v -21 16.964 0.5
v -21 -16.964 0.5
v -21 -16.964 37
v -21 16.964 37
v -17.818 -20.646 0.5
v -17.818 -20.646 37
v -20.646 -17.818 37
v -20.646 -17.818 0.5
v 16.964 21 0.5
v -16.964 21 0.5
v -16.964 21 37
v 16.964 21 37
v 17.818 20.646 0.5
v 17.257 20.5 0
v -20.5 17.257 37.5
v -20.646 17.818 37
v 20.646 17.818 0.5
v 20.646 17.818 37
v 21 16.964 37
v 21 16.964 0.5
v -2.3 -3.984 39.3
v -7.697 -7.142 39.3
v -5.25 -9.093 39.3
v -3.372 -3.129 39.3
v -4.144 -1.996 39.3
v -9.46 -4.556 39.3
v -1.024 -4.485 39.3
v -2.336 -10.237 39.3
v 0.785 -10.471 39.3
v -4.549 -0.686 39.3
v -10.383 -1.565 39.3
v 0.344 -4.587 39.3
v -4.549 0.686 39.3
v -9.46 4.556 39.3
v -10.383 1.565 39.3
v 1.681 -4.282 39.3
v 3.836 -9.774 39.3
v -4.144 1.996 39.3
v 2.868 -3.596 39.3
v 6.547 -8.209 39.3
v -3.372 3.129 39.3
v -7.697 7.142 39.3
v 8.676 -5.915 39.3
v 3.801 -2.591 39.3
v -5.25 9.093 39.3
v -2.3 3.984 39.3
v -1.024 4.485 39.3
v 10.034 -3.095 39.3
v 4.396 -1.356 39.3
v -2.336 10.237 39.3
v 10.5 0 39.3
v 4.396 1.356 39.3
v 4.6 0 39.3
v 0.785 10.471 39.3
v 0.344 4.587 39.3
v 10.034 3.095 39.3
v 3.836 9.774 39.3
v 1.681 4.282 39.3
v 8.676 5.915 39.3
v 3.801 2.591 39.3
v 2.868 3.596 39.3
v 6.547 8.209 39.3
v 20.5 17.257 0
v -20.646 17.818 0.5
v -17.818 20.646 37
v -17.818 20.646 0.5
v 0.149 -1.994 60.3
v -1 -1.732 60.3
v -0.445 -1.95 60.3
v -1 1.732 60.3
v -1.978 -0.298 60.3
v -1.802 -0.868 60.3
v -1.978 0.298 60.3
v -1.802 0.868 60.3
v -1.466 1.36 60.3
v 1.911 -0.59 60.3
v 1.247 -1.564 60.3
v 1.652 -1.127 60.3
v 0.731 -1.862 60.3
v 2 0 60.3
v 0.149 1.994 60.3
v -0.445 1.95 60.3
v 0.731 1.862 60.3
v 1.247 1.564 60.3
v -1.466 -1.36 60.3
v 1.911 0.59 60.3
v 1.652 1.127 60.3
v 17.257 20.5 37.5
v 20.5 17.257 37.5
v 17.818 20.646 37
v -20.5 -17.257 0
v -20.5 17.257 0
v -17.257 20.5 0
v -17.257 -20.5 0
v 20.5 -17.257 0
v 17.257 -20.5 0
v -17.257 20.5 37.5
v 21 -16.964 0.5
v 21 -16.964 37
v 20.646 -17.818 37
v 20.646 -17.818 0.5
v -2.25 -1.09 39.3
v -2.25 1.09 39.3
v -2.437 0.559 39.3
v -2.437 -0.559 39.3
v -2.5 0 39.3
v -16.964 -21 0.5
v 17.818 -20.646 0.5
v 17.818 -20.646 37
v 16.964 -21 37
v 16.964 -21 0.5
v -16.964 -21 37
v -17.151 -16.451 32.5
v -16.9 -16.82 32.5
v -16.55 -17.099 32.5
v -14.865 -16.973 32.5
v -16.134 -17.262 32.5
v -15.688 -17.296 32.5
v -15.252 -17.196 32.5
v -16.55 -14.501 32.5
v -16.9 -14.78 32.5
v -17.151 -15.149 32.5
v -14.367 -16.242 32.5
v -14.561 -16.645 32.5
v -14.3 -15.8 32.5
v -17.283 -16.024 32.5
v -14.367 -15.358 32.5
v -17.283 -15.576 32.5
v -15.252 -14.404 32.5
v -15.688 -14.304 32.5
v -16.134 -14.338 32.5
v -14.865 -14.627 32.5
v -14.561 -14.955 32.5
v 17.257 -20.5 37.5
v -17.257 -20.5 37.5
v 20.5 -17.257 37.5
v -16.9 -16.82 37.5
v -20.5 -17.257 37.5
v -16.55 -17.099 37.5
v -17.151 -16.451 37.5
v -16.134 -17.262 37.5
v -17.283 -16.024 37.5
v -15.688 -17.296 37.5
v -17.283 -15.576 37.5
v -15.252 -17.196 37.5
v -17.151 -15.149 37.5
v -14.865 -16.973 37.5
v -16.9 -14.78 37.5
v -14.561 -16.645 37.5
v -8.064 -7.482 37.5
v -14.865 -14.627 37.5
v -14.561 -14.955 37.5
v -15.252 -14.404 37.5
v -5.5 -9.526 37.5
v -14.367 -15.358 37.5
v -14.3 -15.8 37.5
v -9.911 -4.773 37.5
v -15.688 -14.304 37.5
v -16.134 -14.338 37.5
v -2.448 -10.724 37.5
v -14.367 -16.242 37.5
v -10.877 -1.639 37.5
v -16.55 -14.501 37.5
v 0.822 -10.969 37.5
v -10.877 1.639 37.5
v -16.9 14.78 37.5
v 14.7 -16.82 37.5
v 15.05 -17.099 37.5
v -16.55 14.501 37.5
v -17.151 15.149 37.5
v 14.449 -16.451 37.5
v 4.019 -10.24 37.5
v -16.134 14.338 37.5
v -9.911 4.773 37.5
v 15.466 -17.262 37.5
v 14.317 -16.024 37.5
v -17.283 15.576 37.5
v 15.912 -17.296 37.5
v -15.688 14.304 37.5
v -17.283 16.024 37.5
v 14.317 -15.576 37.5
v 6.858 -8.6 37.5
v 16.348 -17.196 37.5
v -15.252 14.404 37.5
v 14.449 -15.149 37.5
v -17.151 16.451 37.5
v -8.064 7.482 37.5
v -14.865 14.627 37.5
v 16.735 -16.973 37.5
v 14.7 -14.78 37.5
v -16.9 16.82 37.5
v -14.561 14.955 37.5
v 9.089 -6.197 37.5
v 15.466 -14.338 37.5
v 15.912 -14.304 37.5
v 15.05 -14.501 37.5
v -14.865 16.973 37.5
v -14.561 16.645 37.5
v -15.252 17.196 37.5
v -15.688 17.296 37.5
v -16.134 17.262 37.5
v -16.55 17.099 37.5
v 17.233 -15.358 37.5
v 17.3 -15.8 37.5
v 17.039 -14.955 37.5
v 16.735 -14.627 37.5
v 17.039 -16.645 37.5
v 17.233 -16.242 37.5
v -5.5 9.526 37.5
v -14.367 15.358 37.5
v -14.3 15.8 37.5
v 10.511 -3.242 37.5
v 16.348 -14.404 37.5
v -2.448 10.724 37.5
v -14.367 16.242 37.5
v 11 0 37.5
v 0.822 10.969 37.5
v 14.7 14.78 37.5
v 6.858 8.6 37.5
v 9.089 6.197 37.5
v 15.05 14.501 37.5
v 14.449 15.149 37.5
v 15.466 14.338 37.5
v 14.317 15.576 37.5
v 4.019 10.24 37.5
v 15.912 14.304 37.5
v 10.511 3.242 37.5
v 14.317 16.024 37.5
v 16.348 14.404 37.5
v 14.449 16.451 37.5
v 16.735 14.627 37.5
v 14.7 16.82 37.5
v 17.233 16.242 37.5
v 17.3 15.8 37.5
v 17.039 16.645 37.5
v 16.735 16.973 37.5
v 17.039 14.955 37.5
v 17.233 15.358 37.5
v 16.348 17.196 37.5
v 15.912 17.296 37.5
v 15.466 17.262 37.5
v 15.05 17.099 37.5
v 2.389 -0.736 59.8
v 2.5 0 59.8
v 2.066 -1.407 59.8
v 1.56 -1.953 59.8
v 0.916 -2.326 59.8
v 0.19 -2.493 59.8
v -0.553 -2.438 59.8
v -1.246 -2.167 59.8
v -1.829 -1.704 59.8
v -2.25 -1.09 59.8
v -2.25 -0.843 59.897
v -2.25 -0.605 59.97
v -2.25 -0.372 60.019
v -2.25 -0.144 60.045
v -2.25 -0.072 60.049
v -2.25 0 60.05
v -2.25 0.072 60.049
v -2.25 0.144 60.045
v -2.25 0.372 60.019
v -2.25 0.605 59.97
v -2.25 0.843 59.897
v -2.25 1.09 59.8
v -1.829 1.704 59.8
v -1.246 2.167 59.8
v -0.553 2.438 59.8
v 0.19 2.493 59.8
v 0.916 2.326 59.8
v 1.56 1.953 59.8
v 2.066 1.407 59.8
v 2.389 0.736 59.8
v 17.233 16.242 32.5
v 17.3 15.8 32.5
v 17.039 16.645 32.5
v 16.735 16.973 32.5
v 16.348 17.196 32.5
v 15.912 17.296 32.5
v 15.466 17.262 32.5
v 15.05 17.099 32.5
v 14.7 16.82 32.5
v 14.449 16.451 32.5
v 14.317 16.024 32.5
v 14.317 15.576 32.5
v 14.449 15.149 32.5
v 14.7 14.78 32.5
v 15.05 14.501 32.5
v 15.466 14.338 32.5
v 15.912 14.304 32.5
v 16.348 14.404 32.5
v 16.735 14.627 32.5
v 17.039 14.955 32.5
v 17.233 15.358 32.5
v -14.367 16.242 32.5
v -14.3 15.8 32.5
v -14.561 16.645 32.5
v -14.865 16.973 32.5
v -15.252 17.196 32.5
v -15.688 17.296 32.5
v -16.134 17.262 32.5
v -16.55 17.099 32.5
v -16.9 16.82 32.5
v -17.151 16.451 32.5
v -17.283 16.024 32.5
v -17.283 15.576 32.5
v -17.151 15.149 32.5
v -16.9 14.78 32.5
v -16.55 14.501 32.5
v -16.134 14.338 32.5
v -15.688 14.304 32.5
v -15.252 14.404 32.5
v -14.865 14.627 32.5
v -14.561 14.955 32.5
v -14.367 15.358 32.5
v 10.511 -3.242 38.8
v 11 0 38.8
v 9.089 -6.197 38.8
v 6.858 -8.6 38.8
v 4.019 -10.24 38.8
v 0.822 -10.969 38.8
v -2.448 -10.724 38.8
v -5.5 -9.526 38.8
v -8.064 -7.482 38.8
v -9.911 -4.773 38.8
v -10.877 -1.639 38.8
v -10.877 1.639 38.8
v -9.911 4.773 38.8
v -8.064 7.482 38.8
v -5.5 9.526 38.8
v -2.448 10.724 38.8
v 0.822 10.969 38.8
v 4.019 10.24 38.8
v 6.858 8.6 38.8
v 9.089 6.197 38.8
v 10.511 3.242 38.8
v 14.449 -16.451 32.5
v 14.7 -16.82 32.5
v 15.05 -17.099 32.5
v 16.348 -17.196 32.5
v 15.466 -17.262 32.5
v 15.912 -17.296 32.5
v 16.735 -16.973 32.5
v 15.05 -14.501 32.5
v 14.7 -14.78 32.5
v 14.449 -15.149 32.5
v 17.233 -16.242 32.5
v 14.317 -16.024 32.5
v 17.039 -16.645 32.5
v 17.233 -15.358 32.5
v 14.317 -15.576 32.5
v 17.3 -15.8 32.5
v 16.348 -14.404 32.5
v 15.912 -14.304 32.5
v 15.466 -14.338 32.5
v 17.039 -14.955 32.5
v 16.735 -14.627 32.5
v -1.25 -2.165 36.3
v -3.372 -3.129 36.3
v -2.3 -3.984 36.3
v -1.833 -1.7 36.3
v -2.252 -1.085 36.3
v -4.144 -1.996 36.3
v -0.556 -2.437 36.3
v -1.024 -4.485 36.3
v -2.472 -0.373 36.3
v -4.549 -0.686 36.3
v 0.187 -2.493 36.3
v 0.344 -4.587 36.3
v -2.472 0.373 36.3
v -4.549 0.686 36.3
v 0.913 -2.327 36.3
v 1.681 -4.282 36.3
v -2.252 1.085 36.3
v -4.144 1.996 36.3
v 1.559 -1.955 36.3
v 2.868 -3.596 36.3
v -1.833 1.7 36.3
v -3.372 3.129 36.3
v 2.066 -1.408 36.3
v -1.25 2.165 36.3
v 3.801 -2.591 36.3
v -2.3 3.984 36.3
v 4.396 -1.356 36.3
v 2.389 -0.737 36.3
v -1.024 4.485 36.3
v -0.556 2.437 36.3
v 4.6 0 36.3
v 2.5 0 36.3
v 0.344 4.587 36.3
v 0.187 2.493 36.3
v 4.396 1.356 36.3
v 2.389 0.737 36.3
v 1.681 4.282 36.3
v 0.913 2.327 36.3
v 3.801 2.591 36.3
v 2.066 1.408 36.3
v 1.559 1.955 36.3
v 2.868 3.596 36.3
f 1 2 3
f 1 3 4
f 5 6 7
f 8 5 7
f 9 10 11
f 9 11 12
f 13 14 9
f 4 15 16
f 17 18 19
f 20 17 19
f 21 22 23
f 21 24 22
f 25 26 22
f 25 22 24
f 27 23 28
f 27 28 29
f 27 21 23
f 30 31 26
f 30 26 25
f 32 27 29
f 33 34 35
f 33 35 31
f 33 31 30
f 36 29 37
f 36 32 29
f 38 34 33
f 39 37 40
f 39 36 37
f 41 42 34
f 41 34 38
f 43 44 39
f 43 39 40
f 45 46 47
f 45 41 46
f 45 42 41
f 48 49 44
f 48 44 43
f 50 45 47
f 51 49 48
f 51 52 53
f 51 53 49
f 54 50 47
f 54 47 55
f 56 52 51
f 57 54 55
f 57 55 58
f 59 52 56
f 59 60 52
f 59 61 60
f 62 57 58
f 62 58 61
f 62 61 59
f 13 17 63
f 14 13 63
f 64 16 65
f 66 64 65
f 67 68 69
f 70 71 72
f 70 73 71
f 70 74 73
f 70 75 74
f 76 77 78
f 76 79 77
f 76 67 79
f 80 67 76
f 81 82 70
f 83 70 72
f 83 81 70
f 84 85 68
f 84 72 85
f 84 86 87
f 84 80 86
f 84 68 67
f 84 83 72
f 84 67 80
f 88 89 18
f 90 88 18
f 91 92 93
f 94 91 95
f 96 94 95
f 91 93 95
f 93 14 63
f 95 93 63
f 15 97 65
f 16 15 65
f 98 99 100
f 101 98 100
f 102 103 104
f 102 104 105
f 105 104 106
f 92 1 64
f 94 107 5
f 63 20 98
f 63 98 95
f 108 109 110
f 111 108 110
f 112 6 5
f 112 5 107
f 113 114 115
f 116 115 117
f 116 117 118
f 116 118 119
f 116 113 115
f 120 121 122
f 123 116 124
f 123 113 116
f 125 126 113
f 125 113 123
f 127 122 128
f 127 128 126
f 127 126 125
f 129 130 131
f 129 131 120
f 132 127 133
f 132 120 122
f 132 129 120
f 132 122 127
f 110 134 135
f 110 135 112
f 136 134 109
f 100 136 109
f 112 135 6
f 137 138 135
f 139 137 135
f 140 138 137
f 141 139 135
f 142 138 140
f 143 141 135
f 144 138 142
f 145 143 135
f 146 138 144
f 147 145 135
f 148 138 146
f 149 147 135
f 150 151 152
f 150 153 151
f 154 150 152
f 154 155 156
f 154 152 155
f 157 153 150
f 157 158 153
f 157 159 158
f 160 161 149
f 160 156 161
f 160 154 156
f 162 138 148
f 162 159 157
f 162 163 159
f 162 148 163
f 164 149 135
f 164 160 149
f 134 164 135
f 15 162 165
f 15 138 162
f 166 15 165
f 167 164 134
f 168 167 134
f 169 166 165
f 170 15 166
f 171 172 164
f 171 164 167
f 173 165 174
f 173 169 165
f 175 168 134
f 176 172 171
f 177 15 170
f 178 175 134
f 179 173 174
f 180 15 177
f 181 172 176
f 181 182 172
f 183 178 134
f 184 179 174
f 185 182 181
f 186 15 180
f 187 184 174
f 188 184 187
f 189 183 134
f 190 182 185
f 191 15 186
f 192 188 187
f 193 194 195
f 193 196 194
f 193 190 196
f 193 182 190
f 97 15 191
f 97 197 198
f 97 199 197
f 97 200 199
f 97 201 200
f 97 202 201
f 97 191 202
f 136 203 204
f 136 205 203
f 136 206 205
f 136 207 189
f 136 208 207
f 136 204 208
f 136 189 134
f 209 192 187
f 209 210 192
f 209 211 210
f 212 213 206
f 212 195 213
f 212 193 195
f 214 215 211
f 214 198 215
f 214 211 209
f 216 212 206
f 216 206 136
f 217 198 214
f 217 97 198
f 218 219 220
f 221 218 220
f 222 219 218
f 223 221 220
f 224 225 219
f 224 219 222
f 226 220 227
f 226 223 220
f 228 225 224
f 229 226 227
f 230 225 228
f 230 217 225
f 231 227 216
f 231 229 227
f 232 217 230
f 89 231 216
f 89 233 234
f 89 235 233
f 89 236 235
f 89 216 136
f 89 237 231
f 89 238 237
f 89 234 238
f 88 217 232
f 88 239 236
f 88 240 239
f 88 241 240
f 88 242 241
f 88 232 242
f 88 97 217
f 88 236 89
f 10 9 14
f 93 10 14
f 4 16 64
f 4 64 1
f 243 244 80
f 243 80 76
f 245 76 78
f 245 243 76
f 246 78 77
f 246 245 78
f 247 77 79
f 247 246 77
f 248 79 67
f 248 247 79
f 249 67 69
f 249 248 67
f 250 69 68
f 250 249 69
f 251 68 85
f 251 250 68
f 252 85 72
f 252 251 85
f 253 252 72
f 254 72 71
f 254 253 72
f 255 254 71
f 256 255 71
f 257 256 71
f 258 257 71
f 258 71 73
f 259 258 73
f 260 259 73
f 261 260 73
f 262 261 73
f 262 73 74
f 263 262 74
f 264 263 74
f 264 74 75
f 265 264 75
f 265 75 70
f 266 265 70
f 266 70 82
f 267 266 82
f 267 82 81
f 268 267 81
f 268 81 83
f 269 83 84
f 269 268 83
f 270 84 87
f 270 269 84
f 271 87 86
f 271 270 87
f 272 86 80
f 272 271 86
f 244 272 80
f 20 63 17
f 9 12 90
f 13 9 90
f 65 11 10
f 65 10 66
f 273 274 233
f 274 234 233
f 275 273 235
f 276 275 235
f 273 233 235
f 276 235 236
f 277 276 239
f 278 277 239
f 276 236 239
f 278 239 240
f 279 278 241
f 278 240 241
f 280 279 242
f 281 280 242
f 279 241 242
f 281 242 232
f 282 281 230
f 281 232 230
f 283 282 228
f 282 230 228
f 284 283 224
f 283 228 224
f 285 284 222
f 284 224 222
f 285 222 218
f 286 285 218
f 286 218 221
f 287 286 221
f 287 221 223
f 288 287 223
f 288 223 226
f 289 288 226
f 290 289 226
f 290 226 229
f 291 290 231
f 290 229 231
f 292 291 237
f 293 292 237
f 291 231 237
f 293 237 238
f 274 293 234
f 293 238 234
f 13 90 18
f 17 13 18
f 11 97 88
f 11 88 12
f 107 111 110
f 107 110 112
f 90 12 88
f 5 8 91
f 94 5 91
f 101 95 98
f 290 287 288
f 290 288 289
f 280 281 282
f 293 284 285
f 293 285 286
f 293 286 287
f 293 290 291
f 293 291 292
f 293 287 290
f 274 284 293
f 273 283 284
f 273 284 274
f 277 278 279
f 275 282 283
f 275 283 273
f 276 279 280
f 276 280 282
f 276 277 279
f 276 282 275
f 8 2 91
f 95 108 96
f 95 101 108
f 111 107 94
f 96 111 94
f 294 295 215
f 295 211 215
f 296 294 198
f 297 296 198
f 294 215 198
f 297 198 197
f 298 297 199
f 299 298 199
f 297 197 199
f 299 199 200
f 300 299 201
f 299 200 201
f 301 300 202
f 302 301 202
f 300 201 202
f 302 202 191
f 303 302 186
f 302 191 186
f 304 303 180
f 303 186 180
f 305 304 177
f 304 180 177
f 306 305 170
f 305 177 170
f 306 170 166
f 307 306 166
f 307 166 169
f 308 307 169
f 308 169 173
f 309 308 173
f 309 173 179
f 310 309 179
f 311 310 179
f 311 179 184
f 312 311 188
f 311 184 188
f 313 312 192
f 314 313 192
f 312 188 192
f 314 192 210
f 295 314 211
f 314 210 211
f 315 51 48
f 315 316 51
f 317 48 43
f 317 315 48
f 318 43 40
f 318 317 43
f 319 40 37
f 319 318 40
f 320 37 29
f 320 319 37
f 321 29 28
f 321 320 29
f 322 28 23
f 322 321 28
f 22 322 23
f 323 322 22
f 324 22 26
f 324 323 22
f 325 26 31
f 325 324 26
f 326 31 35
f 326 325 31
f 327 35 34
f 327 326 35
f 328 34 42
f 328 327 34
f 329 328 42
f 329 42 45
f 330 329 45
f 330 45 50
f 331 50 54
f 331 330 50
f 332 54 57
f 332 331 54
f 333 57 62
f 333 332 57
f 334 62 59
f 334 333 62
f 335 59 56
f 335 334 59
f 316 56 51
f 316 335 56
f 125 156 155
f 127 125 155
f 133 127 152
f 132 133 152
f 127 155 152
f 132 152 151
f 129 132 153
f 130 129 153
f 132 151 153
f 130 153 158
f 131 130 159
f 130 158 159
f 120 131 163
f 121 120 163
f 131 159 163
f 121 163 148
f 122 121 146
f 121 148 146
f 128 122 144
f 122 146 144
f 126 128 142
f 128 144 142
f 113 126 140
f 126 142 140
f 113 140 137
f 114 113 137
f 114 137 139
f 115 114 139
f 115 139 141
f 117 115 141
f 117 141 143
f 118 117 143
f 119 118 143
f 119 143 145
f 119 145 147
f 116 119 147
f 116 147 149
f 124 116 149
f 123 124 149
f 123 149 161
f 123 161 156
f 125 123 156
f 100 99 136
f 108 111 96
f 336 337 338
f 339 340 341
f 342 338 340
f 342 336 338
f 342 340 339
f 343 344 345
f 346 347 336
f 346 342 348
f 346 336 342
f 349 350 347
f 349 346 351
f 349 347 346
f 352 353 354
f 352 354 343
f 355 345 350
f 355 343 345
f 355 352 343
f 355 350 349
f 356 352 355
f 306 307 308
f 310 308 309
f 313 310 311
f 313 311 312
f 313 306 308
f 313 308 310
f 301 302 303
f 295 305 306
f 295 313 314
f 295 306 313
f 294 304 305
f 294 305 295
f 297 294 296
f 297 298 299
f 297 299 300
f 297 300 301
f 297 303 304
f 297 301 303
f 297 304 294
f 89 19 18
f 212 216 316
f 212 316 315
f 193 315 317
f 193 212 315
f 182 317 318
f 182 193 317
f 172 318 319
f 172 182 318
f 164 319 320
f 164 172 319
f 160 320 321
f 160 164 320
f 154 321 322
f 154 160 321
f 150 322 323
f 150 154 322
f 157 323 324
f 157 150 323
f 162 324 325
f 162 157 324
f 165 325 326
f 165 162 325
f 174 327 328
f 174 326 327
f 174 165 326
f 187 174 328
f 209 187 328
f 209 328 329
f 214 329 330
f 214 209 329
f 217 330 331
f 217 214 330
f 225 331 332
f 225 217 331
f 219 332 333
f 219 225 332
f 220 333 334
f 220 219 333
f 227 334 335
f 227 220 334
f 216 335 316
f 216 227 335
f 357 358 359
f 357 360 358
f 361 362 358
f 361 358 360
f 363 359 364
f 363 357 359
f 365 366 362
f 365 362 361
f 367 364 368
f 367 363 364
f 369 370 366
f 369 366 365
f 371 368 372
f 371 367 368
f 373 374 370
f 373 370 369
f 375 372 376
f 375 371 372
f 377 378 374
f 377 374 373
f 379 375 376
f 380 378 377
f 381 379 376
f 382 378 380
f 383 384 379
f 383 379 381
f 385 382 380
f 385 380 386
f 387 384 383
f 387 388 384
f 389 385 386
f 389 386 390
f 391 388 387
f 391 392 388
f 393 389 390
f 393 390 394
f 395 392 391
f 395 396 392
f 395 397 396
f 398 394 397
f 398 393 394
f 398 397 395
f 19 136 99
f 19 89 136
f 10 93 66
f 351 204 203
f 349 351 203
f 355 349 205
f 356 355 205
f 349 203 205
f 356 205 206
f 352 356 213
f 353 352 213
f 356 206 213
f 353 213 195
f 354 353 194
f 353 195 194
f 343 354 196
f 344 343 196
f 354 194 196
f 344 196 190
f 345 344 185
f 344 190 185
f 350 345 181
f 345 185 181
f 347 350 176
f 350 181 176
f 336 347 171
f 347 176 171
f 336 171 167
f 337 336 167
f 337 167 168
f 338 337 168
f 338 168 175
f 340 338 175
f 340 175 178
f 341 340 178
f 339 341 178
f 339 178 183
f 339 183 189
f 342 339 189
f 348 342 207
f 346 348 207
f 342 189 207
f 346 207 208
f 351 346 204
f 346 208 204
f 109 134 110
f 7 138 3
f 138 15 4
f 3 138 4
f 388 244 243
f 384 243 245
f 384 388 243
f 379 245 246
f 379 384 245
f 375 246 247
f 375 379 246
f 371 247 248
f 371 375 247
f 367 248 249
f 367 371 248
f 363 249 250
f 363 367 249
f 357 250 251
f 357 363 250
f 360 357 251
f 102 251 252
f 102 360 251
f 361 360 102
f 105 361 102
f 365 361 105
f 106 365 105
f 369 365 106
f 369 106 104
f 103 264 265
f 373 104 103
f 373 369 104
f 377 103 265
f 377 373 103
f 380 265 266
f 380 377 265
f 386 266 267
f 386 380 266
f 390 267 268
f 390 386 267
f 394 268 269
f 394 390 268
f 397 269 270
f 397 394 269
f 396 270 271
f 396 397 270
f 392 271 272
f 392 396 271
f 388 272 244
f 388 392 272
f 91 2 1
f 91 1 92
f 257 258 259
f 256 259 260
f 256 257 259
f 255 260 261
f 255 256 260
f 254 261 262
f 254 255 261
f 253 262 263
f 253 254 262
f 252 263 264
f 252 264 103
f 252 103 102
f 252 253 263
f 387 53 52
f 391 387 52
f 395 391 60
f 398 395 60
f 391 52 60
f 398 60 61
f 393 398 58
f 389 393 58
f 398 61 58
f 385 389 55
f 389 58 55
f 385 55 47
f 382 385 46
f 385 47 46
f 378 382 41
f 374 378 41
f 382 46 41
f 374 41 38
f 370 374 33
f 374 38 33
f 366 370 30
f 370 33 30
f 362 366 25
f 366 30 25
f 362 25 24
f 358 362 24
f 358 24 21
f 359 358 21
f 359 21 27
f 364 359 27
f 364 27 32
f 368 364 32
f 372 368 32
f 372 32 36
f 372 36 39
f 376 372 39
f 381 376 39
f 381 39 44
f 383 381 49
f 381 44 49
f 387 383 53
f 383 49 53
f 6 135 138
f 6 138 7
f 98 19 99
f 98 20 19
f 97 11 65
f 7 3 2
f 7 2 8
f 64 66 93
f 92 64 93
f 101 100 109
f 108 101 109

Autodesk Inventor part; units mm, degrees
ref_plane "YZ Plane" through (0, 0, 0) normal (1, 0, 0) x (0, 1, 0)
ref_plane "XZ Plane" through (0, 0, 0) normal (0, 1, 0) x (-1, 0, 0)
ref_plane "XY Plane" through (0, 0, 0) normal (0, 0, 1) x (1, 0, 0)
sketch "Sketch1" plane through (0, 0, 0) normal (0, 0, 1) x (1, 0, 0)
  line L0 (-17.4645, 21) -> (17.4645, 21)
  line L1 (21, 17.4645) -> (21, -17.4645)
  line L2 (17.4645, -21) -> (-17.4645, -21)
  line L3 (-21, -17.4645) -> (-21, 17.4645)
  line L4 (-21, 17.4645) -> (-17.4645, 21)
  line L5 (-21, 17.4645) -> (-16, 17.4645) construction
  line L6 (-17.4645, -21) -> (-21, -17.4645)
  line L7 (21, -17.4645) -> (17.4645, -21)
  line L8 (17.4645, 21) -> (21, 17.4645)
  point P0 (0, 0)
  point P1 (0, 21)
  point P2 (-21, 0)
  dimension "d4" = 360
  dimension "d1" = 45
  dimension "d6" = 5
  dimension "d7" = 42
  dimension "d8" = 42
extrude "Extrusion1" add sketch "Sketch1" along normal blind 37.5
sketch "Sketch2" plane through (0, 0, 37.5) normal (0, 0, 1) x (1, 0, 0)
  circle A0 centre (0, 0) radius 11
  dimension "d11" = 22
extrude "Extrusion2" add sketch "Sketch2" along normal blind 1.8
sketch "Sketch3" plane through (0, 0, 39.3) normal (0, 0, 1) x (1, 0, 0)
  circle A0 centre (0, 0) radius 4.6
  dimension "d14" = 9.2
extrude "Extrusion3" cut sketch "Sketch3" against normal blind 3
sketch "Sketch4" plane through (0, 0, 36.3) normal (0, 0, 1) x (1, 0, 0)
  circle A0 centre (0, 0) radius 2.5
  dimension "d17" = 5
extrude "Extrusion4" add sketch "Sketch4" along normal blind 24
sketch "Sketch5" plane through (0, 0, 60.3) normal (0, 0, 1) x (1, 0, 0)
  arc A0 (-2.25, 1.0897) -> (-2.25, -1.0897) centre (0, 0) ccw
  line L0 (-2.25, 1.0897) -> (-2.25, -1.0897)
  circle A1 centre (0, 0) radius 2.5 projected
  dimension "d20" = 2.25
extrude "Extrusion5" cut sketch "Sketch5" against normal blind 21 contours L0 A0
chamfer "Chamfer1" distance 0.5 angle 45 2 edges at (0.559, -2.4367, 60.3) (0.559, 2.4367, 60.3)
sketch "Sketch6" plane through (0, 0, 37.5) normal (0, 0, 1) x (1, 0, 0)
  circle A0 centre (-15.8, 15.8) radius 1.5
  circle A1 centre (15.8, 15.8) radius 1.5
  circle A2 centre (-15.8, -15.8) radius 1.5
  circle A3 centre (15.8, -15.8) radius 1.5
  point P0 (0, 0)
  dimension "d27" = 15.8
  dimension "d28" = 31.6
  dimension "d29" = 15.8
  dimension "d30" = 31.6
  dimension "d31" = 3
extrude "Extrusion6" cut sketch "Sketch6" against normal blind 5
thread "Thread1" size "M3x0.5" class "6H" standard "ANSI Metric M Profile" full length
thread "Thread2" size "M3x0.5" class "6H" standard "ANSI Metric M Profile" full length
thread "Thread3" size "M3x0.5" class "6H" standard "ANSI Metric M Profile" full length
thread "Thread4" size "M3x0.5" class "6H" standard "ANSI Metric M Profile" full length
chamfer "Chamfer2" distance 0.5 angle 45 1 edges at (-11, 0, 39.3)
chamfer "Chamfer3" distance 0.5 angle 45 24 edges at (0, -21, 0) (19.2322, -19.2322, 0) (21, 0, 0) (-21, 0, 0) (0, 21, 0) (21, 0, 37.5) (0, 21, 37.5) (-21, 0, 37.5) (0, -21, 37.5) (19.2322, 19.2322, 37.5) (-19.2322, -19.2322, 37.5) (19.2322, -19.2322, 37.5) (17.4645, -21, 18.75) (21, -17.4645, 18.75) (-17.4645, -21, 18.75) (-21, -17.4645, 18.75) (21, 17.4645, 18.75) (17.4645, 21, 18.75) (-17.4645, 21, 18.75) (-21, 17.4645, 18.75) (-19.2322, 19.2322, 0) (-19.2322, -19.2322, 0) (19.2322, 19.2322, 0) (-19.2322, 19.2322, 37.5)
equation "\"d27\" = 0.5 * d28"
equation "\"d29\" = d27"
equation "\"d30\" = d28"
properties part number "Stepper Motor"
